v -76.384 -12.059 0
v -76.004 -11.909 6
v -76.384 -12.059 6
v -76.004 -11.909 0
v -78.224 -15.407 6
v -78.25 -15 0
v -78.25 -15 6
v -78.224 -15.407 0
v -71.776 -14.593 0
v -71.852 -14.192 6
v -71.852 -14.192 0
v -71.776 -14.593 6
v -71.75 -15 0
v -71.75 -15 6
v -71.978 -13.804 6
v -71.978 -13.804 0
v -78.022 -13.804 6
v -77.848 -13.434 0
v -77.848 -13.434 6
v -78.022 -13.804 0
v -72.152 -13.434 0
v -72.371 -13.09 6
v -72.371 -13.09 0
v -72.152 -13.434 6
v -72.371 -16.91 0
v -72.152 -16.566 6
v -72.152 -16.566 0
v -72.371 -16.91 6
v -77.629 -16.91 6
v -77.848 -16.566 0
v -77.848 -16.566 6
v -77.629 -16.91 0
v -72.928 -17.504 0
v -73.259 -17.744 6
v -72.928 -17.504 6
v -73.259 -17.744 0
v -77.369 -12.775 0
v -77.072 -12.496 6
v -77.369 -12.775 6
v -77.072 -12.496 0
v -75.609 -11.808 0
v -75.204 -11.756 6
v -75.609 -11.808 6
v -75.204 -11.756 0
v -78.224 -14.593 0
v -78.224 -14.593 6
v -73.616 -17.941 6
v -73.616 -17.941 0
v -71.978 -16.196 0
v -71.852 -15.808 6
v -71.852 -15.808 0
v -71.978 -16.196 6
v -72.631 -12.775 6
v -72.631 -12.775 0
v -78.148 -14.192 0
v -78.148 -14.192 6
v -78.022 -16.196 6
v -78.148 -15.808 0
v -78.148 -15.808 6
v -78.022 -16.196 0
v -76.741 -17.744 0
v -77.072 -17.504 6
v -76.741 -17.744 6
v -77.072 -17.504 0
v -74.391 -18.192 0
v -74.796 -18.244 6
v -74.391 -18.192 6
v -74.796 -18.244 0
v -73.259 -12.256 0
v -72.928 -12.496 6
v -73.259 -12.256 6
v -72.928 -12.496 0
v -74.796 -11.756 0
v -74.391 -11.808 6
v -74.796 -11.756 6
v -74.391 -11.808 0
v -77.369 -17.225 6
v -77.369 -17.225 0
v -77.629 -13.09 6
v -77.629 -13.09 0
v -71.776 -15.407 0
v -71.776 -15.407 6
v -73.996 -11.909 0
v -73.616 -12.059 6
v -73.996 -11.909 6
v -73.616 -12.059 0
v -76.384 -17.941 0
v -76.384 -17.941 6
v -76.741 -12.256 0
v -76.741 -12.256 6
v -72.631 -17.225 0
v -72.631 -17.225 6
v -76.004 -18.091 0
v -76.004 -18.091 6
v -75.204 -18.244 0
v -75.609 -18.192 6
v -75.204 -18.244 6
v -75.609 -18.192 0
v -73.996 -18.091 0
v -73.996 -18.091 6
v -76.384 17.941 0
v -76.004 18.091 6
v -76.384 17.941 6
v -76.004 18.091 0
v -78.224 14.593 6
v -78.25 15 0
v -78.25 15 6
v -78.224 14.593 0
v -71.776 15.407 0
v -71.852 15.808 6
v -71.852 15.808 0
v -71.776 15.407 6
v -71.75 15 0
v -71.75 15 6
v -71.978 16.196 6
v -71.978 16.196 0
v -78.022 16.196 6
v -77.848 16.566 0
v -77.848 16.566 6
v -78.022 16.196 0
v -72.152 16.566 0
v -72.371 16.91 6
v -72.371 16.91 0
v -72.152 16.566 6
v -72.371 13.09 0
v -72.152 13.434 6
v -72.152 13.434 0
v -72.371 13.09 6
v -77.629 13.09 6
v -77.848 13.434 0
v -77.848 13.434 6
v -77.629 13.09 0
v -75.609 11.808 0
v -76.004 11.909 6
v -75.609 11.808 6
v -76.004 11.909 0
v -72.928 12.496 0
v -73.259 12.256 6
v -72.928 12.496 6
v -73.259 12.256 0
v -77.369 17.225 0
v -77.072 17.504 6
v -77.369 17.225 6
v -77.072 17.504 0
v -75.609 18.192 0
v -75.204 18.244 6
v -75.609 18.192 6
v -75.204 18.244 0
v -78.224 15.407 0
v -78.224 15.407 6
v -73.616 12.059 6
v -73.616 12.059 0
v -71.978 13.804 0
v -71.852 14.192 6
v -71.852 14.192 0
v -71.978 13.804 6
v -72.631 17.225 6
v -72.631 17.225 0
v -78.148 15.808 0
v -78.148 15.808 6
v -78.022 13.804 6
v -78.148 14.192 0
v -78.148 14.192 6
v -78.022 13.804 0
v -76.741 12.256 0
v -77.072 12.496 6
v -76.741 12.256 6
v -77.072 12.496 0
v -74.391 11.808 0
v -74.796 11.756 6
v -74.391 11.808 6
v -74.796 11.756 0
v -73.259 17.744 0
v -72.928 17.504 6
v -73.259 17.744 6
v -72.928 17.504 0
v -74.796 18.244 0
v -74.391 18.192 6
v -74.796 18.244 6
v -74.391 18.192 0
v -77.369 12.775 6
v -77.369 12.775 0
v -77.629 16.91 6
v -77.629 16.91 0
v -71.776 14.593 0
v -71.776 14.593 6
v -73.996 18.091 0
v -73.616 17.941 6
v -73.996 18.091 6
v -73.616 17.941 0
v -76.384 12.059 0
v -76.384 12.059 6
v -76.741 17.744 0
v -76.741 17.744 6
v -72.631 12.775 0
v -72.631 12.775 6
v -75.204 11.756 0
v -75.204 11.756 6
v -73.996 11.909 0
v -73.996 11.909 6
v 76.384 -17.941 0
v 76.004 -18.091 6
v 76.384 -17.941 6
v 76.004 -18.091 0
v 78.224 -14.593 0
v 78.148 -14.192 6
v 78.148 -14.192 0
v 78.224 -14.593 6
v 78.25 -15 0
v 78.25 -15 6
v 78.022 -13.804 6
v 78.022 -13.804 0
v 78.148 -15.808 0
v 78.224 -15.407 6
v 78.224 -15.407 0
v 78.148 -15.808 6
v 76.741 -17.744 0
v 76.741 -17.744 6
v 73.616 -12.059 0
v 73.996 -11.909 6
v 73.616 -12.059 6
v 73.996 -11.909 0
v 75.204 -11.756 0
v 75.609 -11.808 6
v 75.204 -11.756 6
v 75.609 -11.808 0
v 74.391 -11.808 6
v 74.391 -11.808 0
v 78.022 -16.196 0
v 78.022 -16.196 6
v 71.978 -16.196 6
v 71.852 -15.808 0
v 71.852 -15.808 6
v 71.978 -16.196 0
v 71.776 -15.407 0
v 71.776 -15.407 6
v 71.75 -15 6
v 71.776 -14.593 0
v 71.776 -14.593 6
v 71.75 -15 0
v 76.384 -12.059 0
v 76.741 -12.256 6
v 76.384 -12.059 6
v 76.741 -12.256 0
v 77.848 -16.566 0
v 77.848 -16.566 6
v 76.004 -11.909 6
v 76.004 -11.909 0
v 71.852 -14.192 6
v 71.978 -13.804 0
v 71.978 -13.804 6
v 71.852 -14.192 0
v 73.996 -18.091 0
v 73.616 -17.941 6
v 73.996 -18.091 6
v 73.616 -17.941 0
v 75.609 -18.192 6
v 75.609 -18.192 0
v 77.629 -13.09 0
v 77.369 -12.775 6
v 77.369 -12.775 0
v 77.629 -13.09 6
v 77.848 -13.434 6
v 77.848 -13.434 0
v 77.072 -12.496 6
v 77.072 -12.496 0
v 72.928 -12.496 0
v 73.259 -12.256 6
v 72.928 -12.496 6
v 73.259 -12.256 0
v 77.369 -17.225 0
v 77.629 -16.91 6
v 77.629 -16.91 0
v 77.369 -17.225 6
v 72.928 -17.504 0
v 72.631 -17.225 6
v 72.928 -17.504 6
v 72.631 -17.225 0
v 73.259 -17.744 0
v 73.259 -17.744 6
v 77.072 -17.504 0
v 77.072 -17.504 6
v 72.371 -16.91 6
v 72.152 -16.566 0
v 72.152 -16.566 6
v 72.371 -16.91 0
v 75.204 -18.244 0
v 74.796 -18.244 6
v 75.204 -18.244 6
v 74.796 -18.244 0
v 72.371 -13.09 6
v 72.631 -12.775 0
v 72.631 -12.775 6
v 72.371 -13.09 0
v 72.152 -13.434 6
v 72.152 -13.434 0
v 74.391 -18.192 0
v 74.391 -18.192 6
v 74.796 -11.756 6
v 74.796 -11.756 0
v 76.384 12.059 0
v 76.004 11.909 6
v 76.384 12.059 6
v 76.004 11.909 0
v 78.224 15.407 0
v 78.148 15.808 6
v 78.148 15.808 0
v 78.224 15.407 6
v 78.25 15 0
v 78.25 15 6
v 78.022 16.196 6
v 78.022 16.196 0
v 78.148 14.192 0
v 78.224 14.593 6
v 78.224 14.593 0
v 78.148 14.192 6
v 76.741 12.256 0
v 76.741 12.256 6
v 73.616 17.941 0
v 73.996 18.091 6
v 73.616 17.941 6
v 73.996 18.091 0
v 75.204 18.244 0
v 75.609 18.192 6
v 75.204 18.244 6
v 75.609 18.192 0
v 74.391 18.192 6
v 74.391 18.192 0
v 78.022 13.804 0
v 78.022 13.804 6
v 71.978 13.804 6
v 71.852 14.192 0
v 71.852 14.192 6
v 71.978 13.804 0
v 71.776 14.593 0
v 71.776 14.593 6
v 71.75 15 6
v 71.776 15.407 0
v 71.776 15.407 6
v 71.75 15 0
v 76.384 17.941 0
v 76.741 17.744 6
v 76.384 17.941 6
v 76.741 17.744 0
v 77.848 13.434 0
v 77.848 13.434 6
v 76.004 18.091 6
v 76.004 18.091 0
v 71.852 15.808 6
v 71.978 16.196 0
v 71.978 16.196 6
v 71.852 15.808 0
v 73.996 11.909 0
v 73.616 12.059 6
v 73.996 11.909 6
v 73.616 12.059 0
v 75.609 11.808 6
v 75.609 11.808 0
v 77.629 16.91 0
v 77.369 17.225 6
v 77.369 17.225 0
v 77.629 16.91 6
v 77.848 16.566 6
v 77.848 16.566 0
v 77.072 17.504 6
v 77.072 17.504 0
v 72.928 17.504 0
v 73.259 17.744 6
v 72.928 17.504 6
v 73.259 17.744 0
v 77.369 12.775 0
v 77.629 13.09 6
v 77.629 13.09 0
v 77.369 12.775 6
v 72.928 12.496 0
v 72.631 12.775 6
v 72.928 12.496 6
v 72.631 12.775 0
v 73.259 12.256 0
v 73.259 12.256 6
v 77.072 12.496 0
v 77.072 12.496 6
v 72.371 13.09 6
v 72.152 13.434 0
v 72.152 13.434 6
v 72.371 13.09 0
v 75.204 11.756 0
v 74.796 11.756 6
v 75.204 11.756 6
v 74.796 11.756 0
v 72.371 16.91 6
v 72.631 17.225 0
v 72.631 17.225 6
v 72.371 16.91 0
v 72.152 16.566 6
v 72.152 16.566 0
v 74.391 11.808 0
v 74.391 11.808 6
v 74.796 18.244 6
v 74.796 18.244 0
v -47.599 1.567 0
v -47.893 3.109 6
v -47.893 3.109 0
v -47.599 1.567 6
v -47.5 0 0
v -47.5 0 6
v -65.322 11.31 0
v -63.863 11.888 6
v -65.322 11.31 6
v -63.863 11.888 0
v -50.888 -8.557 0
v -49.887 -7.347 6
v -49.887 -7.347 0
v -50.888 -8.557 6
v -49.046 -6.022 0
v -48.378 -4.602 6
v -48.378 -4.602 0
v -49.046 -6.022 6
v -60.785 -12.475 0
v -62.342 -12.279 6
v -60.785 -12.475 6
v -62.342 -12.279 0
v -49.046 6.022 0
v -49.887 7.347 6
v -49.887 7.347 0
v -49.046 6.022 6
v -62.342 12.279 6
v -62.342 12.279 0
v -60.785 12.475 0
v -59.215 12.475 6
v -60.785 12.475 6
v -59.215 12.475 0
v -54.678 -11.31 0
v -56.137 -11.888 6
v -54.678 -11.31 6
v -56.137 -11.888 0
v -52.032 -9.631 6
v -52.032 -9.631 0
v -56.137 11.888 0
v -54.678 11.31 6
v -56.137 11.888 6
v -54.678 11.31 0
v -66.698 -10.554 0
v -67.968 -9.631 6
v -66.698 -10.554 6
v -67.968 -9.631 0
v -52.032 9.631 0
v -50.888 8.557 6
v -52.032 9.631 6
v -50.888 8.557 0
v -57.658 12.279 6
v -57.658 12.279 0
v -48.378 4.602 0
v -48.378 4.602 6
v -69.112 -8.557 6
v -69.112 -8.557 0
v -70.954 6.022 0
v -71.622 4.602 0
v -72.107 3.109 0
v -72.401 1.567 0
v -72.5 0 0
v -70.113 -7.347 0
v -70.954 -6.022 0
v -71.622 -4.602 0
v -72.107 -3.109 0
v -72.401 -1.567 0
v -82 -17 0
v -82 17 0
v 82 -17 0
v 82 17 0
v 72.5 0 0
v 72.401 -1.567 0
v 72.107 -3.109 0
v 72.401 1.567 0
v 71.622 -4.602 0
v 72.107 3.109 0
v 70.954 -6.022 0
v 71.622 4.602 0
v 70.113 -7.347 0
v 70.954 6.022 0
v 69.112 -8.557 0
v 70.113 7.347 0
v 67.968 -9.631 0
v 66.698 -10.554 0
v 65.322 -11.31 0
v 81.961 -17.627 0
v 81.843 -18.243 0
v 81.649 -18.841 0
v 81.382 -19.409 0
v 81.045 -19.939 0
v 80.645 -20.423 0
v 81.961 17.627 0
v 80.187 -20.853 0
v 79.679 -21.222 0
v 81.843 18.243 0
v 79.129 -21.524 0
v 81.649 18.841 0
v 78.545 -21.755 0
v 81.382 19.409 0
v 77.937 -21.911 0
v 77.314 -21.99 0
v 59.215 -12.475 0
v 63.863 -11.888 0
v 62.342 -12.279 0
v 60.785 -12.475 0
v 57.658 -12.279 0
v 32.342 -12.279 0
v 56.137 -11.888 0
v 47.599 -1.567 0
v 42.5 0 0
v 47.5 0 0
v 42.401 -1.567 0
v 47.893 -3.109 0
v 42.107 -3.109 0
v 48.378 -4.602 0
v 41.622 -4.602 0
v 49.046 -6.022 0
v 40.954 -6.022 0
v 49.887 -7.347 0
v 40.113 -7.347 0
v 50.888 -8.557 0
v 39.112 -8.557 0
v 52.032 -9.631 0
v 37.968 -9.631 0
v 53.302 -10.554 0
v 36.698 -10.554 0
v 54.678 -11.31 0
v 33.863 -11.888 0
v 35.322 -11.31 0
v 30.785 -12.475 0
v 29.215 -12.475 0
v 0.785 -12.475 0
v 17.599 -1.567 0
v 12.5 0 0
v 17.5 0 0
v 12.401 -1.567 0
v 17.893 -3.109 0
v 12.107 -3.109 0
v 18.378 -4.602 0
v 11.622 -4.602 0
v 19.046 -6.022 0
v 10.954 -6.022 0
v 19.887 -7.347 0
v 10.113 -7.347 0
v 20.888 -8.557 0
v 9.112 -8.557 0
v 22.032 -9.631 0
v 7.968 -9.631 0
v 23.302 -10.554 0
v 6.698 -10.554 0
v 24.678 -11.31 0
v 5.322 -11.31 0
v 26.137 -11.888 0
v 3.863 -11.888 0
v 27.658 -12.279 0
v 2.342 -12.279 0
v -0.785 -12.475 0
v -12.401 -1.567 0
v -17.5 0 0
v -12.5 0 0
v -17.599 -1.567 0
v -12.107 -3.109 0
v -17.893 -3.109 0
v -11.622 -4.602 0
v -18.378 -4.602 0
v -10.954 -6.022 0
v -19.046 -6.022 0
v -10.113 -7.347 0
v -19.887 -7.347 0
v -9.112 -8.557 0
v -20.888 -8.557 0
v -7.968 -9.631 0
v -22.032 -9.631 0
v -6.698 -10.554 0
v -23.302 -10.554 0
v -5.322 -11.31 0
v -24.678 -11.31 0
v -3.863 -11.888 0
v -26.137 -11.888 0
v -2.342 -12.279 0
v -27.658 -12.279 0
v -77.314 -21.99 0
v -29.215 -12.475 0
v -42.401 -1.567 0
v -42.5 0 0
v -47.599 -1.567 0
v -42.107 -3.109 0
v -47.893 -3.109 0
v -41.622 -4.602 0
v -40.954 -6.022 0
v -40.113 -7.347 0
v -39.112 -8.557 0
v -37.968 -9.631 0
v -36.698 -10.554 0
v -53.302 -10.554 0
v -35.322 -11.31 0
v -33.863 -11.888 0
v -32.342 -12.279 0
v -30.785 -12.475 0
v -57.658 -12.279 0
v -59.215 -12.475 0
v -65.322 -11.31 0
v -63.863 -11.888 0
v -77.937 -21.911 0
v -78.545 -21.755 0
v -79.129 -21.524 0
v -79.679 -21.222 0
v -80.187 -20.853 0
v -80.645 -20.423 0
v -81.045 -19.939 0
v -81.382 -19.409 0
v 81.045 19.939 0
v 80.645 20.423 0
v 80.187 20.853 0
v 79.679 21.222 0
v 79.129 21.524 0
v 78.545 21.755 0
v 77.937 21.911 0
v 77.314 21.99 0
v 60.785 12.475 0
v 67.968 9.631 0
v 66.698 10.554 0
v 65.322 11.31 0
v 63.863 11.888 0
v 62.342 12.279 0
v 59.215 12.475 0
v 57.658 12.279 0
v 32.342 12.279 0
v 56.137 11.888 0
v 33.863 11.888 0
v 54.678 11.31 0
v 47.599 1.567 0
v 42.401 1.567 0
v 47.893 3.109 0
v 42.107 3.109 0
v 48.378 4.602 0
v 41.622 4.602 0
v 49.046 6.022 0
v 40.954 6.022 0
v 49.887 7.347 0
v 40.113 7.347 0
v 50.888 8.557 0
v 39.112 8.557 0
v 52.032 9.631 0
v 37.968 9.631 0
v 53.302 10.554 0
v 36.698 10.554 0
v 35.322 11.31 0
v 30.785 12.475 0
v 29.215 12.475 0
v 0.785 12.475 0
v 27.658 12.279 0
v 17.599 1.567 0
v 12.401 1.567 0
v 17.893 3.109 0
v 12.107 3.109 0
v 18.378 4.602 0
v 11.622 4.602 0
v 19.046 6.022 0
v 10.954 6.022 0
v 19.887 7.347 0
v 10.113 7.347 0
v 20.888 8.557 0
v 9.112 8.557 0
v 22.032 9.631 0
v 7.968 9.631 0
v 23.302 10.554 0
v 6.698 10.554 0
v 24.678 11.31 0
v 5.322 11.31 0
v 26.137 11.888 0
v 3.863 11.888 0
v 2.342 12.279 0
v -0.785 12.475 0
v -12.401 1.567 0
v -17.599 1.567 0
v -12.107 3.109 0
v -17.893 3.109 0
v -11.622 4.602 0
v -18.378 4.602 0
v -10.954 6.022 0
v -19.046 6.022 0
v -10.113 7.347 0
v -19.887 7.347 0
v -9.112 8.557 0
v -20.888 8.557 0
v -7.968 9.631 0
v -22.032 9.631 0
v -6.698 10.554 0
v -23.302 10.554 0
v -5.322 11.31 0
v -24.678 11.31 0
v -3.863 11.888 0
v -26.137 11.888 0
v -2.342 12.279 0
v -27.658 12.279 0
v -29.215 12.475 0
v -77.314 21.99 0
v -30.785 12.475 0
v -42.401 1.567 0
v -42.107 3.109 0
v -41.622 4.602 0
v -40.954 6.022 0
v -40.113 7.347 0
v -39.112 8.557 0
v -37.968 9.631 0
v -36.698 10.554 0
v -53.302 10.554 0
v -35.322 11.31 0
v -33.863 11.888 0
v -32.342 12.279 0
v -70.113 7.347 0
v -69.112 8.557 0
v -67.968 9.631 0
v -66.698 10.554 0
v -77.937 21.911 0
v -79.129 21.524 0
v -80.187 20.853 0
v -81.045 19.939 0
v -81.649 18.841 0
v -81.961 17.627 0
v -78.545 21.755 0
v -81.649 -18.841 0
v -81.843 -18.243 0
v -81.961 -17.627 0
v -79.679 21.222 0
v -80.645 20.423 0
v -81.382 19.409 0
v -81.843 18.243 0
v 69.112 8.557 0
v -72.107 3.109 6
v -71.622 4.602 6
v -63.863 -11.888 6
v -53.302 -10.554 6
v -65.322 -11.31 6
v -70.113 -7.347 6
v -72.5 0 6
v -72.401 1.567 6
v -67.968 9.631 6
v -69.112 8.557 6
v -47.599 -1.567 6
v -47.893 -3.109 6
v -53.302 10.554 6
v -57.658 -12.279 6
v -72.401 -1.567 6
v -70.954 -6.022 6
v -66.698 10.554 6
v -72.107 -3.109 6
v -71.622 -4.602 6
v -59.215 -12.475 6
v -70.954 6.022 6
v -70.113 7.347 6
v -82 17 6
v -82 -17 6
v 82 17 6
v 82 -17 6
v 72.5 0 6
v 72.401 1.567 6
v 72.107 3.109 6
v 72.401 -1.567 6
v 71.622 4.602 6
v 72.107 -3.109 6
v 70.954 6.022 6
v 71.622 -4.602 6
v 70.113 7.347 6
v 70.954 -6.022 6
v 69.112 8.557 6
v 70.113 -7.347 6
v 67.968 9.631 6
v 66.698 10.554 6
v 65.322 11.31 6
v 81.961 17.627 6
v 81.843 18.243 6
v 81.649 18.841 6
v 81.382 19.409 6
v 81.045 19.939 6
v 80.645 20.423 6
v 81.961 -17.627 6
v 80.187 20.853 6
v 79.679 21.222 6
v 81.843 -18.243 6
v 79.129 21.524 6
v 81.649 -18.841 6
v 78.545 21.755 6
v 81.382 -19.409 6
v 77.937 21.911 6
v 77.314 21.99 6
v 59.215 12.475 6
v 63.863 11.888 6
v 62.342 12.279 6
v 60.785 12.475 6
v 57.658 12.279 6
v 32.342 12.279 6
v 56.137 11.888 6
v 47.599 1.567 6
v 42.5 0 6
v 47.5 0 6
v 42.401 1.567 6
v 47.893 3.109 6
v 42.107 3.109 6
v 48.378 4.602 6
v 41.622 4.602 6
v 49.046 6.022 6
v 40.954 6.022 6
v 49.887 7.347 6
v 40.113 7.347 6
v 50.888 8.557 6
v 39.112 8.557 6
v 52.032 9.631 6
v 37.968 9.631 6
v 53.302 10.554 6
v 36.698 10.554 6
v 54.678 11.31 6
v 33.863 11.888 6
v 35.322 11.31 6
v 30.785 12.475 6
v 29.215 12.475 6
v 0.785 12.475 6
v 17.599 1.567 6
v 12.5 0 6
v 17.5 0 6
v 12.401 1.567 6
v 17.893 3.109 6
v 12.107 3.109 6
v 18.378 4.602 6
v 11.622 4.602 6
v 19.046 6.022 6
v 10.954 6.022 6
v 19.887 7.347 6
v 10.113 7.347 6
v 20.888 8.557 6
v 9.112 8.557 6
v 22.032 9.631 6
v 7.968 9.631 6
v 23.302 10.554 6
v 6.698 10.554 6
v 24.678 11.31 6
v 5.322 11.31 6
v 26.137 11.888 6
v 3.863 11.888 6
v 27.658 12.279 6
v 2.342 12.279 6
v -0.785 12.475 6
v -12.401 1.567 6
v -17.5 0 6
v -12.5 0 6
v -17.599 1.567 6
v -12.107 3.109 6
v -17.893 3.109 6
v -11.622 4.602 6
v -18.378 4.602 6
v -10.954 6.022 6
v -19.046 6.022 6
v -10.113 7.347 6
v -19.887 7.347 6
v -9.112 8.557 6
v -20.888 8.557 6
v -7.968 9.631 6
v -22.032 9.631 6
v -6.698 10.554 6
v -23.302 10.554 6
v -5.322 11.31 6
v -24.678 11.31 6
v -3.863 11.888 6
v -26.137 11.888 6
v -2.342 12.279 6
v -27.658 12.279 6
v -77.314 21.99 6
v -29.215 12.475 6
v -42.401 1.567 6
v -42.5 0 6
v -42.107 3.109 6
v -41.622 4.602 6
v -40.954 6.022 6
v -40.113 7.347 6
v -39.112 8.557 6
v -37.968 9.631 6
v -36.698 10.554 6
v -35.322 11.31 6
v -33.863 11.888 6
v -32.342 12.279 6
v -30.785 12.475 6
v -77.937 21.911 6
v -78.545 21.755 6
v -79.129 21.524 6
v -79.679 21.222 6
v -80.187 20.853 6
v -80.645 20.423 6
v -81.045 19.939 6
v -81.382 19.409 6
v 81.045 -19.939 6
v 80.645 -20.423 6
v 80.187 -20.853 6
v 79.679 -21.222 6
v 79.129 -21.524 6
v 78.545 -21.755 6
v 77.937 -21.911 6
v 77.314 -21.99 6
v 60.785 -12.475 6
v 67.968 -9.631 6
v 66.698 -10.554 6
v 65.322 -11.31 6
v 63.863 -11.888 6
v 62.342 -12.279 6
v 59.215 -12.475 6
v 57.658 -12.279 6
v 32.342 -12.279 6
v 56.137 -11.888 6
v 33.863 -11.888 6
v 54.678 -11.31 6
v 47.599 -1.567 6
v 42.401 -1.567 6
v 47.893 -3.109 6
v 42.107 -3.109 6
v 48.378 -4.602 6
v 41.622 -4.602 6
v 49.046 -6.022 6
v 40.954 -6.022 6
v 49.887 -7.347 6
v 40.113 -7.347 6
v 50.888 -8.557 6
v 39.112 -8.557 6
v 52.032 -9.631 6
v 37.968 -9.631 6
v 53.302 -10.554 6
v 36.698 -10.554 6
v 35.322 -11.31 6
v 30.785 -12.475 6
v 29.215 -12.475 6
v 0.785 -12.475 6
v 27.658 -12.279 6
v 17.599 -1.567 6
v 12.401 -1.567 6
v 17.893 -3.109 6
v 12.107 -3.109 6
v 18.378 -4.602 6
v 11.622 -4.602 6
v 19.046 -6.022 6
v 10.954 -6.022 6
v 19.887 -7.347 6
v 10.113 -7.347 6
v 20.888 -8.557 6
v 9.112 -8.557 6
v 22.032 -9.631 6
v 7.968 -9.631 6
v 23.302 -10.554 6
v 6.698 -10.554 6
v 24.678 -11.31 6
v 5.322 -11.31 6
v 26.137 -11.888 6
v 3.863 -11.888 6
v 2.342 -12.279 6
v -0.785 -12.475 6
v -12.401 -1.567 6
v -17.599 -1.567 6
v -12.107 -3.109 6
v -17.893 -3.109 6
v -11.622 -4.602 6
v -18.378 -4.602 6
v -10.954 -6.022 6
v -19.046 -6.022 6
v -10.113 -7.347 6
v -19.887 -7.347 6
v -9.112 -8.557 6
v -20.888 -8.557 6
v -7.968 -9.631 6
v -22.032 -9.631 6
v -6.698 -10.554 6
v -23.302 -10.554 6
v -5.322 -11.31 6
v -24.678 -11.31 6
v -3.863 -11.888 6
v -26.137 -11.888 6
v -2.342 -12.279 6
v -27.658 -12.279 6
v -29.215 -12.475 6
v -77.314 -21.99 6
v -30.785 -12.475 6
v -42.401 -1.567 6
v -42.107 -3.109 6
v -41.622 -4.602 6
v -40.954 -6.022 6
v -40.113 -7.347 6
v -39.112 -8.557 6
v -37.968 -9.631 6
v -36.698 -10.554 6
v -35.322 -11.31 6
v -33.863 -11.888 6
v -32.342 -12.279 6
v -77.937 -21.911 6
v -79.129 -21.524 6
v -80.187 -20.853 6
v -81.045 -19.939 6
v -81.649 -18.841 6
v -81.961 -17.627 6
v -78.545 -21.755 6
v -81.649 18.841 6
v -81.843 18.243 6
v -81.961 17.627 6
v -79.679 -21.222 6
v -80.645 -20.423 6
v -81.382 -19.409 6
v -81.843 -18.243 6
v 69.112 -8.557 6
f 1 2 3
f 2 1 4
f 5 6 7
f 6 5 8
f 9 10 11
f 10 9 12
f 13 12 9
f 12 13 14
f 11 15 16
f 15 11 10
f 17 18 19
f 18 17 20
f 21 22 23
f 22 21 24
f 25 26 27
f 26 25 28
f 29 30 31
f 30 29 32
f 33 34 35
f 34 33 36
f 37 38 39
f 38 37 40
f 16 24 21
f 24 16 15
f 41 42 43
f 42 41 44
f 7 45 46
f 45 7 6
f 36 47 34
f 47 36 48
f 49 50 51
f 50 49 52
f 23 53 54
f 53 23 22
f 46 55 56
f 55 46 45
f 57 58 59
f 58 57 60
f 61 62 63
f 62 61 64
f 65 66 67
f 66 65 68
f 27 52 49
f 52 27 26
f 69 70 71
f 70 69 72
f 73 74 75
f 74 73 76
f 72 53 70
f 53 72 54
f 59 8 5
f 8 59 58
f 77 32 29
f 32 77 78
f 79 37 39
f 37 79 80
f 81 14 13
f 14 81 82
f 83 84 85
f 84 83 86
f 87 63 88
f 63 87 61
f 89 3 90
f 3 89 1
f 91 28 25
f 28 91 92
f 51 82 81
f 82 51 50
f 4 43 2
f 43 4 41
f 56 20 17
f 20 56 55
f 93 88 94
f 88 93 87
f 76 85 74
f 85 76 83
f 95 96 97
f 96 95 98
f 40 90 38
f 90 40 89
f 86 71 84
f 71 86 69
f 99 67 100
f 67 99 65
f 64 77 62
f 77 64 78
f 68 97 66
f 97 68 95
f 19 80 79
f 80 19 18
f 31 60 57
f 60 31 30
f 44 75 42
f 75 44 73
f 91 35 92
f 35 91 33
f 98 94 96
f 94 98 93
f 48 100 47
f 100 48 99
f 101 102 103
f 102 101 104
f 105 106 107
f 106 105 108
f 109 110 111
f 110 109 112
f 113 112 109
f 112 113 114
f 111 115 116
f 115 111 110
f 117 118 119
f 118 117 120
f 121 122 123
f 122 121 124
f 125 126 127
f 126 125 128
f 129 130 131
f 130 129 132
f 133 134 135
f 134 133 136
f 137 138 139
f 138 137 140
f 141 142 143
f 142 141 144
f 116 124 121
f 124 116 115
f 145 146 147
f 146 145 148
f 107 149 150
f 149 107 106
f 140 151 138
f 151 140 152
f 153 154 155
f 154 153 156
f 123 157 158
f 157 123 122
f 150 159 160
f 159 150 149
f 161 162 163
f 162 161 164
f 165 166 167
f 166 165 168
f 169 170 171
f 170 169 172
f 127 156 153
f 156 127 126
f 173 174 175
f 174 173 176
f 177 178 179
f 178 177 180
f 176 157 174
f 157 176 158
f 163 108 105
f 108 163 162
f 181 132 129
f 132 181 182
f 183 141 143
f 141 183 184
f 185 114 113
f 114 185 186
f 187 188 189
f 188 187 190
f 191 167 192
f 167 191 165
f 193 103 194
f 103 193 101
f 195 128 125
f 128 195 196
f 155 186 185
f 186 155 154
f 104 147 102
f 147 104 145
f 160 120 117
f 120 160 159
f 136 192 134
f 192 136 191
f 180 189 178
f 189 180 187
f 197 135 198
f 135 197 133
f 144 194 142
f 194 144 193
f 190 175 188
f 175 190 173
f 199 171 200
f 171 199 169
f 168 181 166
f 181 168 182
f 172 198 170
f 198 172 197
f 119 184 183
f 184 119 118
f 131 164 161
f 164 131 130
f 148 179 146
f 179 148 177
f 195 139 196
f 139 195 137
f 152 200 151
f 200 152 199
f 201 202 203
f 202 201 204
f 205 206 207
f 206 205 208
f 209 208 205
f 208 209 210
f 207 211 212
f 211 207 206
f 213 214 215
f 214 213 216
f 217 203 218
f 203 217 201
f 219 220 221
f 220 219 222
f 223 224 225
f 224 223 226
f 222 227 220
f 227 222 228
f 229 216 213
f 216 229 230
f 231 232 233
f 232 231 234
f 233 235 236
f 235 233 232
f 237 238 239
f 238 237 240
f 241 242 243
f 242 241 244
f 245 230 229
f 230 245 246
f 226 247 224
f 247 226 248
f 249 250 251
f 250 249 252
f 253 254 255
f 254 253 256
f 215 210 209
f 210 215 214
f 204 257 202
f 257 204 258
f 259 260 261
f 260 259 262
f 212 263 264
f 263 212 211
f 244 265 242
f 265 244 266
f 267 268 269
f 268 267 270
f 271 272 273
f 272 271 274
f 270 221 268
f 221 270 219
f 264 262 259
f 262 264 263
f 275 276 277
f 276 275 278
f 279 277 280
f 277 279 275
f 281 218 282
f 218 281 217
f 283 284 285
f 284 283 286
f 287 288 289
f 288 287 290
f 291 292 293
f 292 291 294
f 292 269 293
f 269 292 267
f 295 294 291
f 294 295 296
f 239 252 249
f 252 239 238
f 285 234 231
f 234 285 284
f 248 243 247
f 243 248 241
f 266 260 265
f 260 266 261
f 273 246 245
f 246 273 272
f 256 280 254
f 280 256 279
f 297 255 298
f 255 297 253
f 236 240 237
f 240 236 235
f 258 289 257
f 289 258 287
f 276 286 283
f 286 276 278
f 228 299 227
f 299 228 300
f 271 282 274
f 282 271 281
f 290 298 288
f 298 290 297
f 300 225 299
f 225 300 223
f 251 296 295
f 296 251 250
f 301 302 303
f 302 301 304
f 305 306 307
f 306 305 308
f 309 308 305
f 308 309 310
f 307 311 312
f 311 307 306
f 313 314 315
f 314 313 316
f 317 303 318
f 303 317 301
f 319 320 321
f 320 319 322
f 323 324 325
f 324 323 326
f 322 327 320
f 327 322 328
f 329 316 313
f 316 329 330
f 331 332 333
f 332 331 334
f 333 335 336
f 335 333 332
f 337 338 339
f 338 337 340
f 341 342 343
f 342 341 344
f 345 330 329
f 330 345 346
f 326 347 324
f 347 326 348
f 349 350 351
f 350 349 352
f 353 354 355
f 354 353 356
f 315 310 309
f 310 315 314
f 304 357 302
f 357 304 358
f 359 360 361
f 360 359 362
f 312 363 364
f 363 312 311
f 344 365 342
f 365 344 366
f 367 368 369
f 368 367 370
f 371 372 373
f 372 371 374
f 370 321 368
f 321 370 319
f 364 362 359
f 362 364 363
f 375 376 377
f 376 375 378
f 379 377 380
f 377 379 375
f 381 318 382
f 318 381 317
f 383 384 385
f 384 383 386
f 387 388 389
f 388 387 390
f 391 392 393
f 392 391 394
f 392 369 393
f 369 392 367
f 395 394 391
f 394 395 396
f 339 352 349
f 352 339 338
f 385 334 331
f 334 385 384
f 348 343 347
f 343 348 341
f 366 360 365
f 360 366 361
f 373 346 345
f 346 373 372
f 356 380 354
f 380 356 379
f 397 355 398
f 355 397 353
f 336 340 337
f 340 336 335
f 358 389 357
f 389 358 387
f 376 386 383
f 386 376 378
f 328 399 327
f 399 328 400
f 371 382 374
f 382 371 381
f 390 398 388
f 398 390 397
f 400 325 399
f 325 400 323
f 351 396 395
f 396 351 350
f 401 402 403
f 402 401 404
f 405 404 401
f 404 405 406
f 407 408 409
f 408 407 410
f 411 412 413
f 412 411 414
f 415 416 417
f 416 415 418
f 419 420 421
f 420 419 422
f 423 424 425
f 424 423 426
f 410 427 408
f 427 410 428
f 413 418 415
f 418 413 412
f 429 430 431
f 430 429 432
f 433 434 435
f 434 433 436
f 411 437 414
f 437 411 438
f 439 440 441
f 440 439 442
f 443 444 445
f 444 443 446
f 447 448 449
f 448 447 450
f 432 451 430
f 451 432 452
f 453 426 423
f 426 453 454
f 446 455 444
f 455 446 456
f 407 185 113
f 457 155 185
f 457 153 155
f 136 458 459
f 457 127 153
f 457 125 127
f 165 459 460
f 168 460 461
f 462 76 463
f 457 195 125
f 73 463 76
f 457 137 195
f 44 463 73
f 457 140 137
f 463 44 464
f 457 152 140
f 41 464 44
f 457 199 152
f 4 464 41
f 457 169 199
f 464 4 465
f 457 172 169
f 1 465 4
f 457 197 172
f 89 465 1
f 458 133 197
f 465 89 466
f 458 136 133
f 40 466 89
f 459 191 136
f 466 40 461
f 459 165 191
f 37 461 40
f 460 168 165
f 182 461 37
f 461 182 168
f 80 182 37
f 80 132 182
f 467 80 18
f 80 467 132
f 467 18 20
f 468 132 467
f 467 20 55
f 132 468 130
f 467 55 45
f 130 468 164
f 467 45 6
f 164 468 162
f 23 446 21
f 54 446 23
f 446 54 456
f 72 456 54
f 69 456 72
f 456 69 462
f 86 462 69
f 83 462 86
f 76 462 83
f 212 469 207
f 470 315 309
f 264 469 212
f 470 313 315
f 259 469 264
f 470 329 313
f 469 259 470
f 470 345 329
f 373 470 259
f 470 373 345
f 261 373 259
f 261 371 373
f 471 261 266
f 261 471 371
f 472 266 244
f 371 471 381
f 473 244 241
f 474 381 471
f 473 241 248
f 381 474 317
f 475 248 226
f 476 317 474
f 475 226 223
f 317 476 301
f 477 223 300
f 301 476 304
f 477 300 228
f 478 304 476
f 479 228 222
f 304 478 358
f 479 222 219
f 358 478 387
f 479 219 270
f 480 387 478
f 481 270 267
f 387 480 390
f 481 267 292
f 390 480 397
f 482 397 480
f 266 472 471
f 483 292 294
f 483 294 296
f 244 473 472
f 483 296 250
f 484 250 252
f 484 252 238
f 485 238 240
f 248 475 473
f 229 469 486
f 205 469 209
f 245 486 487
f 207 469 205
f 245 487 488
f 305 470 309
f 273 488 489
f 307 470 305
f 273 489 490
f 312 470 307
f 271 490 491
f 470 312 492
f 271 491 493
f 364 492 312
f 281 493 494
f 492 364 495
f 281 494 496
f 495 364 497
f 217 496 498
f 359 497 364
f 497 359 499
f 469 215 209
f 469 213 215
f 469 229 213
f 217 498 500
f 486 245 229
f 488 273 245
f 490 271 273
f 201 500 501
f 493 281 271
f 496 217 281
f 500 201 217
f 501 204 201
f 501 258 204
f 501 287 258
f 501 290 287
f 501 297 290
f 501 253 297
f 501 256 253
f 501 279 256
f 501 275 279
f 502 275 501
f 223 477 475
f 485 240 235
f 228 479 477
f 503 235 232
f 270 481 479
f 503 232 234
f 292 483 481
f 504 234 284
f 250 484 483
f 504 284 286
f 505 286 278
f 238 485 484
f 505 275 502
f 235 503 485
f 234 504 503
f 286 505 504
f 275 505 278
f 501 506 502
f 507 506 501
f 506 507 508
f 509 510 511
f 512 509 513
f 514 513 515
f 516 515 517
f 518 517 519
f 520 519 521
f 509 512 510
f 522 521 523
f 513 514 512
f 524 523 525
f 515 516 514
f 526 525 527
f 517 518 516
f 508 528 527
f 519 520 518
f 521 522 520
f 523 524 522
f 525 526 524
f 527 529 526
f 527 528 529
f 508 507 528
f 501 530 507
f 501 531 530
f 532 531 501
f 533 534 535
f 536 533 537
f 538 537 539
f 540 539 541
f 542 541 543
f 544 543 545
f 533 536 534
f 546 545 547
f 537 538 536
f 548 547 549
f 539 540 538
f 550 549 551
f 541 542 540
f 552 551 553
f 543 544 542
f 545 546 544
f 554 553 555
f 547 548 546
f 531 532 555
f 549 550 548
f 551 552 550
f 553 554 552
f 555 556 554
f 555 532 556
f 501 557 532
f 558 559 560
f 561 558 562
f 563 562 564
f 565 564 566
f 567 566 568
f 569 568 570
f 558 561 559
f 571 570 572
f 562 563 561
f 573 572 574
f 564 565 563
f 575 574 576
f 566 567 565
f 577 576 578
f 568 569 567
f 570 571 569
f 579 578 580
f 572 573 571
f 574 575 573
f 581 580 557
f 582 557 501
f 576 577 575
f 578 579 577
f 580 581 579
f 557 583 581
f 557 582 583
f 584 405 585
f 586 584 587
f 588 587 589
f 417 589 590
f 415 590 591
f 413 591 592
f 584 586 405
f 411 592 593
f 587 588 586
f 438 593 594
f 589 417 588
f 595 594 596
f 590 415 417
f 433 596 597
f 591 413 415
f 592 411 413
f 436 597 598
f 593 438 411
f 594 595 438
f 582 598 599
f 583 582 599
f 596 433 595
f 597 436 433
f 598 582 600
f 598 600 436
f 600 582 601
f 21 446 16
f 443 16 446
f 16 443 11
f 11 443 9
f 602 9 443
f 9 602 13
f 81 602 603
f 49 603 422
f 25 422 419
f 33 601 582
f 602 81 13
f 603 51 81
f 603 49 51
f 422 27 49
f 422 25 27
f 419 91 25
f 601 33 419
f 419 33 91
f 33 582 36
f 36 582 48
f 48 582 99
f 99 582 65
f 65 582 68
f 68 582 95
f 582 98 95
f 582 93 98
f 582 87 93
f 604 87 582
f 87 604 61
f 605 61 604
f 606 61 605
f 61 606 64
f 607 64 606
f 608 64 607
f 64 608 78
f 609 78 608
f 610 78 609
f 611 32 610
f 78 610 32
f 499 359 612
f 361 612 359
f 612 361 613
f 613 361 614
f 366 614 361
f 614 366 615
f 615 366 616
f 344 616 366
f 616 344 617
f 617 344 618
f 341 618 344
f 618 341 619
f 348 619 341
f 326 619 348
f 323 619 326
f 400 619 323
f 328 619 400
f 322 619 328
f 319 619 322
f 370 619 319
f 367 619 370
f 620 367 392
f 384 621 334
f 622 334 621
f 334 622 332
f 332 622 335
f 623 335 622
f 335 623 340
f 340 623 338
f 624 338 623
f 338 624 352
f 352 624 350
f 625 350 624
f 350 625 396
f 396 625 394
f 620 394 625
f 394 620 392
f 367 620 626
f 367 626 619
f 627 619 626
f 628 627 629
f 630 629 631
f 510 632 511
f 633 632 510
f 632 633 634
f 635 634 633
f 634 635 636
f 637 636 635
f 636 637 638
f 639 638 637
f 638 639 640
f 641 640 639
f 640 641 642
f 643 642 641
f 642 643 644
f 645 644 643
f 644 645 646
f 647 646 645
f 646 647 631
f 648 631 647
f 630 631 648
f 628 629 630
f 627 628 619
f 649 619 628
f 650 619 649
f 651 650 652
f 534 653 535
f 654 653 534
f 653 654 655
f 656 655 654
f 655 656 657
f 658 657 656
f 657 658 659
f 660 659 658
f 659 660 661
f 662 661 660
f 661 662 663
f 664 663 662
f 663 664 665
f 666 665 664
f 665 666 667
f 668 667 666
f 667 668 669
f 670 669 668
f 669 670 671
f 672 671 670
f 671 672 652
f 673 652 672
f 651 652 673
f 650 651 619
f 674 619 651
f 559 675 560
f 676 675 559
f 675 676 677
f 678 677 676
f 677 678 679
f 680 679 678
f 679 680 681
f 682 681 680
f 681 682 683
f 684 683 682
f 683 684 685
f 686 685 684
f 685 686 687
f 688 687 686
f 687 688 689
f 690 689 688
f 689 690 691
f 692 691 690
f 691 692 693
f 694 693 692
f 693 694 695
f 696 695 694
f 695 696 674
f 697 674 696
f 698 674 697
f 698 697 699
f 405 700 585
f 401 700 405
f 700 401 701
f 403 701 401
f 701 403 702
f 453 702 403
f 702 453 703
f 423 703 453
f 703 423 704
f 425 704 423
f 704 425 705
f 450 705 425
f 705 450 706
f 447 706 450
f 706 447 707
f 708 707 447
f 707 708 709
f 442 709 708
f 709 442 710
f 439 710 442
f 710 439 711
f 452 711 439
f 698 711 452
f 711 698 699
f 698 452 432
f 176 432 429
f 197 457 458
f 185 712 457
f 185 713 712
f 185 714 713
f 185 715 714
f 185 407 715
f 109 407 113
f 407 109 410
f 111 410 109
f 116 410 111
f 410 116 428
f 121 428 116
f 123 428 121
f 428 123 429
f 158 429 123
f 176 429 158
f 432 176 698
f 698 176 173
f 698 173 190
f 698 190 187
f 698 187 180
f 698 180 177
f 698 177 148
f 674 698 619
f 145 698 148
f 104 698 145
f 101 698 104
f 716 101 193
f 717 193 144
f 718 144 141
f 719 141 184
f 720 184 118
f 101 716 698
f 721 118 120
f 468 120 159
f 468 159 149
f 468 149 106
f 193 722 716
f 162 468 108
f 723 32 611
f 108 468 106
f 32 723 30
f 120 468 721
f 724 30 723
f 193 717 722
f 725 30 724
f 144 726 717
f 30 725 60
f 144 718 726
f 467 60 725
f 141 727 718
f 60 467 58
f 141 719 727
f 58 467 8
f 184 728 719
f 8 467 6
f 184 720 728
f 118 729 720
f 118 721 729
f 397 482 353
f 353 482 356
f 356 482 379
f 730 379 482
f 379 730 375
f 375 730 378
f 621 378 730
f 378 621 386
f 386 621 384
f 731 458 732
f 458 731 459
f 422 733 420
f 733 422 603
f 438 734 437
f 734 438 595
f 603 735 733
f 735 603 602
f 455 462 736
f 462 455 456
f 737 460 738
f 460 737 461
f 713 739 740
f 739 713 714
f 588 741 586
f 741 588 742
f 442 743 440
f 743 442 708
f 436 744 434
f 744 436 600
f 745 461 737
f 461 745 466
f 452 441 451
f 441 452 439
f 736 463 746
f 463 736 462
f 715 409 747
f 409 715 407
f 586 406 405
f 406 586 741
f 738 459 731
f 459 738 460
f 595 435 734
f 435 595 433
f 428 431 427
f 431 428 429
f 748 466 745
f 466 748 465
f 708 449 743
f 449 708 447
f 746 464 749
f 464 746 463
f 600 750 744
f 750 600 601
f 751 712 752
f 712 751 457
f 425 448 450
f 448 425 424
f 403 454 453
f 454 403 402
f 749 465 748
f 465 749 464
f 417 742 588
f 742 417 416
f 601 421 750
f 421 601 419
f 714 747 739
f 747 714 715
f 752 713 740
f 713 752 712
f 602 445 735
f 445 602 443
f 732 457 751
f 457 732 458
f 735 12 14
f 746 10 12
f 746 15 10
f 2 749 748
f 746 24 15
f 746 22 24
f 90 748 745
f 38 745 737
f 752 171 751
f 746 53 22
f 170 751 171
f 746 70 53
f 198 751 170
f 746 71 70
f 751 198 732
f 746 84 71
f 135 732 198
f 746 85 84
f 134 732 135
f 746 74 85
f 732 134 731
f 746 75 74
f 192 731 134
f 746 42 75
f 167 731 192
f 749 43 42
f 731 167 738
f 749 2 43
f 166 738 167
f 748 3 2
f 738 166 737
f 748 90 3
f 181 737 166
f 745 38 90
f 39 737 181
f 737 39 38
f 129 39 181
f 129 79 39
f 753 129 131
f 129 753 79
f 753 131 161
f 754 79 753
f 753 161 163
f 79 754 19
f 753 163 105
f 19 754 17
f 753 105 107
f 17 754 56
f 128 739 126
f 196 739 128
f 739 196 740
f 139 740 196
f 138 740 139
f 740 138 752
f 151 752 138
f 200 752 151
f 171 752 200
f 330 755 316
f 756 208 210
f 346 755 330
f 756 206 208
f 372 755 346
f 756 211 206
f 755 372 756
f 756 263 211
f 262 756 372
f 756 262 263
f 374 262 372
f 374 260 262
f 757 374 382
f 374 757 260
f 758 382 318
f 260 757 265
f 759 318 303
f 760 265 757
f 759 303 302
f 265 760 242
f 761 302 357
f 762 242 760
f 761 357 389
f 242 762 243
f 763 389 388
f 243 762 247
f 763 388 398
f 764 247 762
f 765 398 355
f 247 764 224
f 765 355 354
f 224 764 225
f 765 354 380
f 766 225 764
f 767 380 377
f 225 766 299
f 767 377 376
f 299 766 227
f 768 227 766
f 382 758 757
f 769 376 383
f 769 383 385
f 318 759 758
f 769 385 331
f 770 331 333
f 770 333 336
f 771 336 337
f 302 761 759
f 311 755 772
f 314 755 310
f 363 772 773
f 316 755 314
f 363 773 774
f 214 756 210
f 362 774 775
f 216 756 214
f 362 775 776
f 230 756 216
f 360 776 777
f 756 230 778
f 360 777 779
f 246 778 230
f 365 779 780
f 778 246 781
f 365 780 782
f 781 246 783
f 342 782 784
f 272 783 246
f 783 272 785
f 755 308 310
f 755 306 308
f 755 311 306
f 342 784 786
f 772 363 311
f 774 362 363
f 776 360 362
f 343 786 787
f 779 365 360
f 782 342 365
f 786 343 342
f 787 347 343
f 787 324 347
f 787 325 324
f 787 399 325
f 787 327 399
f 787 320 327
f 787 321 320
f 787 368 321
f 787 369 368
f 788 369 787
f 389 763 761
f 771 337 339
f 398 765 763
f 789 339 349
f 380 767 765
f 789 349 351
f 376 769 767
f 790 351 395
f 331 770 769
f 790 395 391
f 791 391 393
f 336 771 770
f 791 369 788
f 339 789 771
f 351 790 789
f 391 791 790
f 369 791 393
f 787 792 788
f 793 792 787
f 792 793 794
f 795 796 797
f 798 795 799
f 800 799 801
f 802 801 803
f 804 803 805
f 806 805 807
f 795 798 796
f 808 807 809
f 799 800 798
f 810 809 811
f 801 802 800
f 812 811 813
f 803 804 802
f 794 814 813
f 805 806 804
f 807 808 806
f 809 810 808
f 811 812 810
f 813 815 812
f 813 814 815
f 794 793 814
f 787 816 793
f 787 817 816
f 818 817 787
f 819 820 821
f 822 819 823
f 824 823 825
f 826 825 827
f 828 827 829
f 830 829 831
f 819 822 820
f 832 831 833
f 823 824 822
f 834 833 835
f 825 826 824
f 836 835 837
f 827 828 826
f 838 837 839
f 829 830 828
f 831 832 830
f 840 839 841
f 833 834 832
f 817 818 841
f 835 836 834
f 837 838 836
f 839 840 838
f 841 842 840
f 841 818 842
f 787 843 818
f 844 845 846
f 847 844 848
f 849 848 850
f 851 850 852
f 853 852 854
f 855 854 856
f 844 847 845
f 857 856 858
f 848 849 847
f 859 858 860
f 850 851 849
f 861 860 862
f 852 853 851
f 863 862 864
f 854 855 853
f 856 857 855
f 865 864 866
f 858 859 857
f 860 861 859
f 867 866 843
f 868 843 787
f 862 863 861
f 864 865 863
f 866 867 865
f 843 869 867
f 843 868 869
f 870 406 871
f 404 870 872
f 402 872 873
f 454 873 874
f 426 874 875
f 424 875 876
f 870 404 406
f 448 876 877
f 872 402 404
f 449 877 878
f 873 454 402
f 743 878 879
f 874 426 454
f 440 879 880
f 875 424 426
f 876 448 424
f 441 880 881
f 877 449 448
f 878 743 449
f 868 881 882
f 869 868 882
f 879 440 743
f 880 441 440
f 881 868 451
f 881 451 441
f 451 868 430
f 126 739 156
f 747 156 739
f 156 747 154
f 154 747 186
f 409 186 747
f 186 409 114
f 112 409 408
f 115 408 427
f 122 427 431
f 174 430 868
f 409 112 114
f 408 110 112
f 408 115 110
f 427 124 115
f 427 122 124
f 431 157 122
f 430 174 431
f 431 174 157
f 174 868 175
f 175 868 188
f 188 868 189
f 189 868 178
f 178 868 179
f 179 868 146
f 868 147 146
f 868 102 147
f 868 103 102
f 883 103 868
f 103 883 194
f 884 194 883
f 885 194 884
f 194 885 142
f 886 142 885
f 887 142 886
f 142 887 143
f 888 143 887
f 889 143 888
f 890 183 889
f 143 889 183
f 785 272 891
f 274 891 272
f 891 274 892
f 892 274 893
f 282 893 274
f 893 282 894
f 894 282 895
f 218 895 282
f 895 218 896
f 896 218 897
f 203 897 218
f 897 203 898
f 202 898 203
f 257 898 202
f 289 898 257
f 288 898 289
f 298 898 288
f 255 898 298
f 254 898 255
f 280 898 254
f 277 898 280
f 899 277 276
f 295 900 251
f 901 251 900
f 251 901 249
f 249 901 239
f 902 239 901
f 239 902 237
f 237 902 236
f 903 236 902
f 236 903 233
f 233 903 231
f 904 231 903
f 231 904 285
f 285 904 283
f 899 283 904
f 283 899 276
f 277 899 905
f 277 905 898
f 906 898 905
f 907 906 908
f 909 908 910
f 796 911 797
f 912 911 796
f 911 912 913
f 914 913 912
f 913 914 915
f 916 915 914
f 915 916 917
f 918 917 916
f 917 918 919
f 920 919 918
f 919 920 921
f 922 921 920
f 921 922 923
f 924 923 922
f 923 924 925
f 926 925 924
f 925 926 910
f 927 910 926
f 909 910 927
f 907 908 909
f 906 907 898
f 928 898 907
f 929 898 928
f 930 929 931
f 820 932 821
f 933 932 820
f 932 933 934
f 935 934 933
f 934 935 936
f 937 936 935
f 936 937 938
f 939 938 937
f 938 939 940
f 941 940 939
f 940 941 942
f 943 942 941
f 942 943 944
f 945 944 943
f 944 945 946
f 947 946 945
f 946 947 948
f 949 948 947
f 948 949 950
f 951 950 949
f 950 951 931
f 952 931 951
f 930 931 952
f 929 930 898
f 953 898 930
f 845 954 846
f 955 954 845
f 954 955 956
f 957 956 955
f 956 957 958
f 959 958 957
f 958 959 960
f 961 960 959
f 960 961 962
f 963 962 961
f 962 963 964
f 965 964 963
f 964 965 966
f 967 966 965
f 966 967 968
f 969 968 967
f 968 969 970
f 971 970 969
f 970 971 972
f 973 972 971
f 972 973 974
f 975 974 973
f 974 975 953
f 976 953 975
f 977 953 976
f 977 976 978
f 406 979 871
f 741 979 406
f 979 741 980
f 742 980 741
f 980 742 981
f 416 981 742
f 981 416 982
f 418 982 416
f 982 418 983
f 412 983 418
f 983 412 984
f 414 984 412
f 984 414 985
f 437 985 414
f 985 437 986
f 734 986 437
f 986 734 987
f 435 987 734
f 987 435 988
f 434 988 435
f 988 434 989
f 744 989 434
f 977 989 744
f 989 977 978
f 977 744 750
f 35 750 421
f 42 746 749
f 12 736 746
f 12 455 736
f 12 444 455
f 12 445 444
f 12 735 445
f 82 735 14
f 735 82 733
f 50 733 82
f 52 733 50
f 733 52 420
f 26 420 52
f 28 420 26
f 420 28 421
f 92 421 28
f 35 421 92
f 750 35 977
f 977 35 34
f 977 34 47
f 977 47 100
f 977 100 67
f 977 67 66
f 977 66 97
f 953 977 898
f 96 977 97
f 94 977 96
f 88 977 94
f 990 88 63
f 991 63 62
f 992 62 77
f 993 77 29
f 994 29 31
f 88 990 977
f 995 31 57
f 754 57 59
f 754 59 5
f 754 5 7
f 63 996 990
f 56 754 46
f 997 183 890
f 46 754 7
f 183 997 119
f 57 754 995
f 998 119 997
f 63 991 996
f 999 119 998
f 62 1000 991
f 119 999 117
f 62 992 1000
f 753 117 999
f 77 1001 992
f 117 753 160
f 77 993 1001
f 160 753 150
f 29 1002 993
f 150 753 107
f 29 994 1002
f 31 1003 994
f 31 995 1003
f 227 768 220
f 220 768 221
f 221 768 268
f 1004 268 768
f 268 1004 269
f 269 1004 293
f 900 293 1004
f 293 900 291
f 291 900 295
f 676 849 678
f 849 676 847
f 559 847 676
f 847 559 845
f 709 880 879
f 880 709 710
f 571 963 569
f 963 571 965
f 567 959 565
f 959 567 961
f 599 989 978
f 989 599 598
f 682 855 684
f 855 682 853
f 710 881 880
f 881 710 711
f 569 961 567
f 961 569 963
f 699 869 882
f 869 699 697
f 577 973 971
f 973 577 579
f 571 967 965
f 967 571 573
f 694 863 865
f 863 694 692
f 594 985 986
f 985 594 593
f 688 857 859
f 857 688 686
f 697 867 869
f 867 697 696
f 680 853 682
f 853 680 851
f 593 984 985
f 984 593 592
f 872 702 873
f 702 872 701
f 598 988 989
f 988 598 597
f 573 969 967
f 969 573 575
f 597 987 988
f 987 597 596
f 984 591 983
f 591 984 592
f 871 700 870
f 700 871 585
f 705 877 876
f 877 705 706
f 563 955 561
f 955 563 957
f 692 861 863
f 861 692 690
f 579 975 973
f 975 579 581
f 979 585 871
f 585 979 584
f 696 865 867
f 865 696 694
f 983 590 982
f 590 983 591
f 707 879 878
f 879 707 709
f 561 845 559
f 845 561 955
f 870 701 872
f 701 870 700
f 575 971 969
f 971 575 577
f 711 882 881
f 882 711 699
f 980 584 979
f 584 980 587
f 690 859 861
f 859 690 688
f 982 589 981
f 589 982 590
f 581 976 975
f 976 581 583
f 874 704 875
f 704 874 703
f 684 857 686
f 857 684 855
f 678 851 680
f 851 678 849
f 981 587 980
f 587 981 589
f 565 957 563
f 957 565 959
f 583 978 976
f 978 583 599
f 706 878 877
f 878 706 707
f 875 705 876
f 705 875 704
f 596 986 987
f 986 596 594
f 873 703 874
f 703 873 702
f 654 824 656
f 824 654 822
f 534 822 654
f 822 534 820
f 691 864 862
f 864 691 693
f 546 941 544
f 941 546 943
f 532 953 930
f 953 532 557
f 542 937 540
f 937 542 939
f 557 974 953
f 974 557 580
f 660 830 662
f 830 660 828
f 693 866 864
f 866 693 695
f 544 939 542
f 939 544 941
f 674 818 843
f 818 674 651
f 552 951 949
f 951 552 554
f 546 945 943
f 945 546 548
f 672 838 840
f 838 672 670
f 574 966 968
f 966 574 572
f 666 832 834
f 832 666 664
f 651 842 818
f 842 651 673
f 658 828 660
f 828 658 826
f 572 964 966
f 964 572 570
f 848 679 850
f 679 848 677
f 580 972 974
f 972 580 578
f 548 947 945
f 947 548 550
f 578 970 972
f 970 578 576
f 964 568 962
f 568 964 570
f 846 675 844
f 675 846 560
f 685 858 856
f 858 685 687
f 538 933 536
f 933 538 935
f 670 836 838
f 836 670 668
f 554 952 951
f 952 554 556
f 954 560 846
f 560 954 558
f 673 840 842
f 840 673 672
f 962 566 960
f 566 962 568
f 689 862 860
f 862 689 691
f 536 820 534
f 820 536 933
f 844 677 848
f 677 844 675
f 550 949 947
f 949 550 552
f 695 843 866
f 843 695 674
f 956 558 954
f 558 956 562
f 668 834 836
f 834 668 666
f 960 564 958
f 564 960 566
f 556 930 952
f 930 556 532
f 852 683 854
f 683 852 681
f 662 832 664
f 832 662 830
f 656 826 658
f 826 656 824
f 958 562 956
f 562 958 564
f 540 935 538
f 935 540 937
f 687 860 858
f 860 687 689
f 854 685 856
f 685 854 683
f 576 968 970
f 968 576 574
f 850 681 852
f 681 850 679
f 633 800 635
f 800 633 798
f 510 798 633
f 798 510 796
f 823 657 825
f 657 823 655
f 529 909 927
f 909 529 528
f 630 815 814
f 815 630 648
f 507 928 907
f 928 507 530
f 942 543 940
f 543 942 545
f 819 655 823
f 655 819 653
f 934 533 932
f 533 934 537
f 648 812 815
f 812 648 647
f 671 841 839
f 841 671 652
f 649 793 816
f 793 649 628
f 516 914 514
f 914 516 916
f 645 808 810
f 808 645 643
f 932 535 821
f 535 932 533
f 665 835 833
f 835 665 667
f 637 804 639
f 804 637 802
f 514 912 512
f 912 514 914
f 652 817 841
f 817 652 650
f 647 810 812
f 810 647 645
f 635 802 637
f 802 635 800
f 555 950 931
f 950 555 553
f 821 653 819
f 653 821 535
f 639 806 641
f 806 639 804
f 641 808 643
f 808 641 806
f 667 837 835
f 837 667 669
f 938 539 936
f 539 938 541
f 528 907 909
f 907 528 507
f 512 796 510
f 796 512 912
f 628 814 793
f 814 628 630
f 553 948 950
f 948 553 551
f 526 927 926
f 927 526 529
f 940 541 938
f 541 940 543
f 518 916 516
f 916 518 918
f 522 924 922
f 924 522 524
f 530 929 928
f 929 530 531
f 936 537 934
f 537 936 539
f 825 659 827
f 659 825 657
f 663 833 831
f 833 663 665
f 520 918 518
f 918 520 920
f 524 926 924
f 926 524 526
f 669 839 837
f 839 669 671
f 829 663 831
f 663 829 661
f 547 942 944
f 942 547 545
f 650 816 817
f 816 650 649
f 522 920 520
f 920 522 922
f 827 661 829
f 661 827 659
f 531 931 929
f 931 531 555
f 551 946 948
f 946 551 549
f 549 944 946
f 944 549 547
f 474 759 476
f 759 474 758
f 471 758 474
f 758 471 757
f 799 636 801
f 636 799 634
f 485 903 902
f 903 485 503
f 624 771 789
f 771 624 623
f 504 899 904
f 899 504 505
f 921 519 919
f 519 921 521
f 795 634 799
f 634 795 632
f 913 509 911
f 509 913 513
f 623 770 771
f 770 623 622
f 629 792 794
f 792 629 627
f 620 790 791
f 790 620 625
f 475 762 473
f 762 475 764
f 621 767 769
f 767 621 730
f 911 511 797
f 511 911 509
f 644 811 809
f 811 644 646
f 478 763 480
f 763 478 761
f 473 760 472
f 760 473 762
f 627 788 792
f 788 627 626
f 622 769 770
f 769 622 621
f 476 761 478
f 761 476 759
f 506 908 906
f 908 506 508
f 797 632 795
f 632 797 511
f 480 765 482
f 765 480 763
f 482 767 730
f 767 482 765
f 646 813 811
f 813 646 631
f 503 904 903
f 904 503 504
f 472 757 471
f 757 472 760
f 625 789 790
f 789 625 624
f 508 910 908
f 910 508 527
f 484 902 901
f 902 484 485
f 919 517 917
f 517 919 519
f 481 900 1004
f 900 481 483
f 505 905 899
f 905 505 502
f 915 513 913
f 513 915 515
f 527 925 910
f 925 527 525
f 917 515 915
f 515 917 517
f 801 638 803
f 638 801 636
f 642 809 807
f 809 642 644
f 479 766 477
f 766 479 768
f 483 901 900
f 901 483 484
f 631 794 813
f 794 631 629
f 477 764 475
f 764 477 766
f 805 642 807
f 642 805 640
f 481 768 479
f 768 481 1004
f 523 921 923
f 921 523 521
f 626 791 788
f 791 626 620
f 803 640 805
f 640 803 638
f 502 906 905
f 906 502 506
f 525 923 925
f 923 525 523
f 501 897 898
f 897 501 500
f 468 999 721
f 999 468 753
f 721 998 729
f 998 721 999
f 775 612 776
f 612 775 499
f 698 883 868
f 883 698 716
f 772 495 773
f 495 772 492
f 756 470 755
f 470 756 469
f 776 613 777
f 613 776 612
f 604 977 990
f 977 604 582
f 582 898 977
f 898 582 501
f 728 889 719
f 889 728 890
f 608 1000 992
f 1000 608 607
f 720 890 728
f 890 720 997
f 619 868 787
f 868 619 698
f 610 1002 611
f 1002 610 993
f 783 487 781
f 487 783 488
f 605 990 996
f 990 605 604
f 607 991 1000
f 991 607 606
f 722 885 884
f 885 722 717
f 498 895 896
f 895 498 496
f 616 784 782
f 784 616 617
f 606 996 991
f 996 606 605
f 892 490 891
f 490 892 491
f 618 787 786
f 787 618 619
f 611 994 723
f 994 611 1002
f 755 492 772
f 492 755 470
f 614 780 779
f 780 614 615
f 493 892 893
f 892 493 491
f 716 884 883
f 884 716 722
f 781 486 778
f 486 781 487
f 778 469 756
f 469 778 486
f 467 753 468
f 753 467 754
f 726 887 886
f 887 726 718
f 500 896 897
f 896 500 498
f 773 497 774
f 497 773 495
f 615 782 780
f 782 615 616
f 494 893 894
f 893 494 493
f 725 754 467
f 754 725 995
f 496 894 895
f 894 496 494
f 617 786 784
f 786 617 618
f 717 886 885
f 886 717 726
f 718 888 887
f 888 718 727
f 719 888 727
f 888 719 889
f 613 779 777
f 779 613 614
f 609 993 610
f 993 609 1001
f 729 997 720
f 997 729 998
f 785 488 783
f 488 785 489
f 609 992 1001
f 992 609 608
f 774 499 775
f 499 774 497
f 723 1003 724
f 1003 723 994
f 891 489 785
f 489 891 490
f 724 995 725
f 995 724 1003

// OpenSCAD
$fn = 50;


difference() {
	union() {
		hull() {
			translate(v = [-77.0000000000, 17.0000000000, 0]) {
				cylinder(h = 6, r = 5);
			}
			translate(v = [77.0000000000, 17.0000000000, 0]) {
				cylinder(h = 6, r = 5);
			}
			translate(v = [-77.0000000000, -17.0000000000, 0]) {
				cylinder(h = 6, r = 5);
			}
			translate(v = [77.0000000000, -17.0000000000, 0]) {
				cylinder(h = 6, r = 5);
			}
		}
	}
	union() {
		#translate(v = [-75.0000000000, -15.0000000000, -100.0000000000]) {
			cylinder(h = 200, r = 3.2500000000);
		}
		#translate(v = [-75.0000000000, 15.0000000000, -100.0000000000]) {
			cylinder(h = 200, r = 3.2500000000);
		}
		#translate(v = [75.0000000000, -15.0000000000, -100.0000000000]) {
			cylinder(h = 200, r = 3.2500000000);
		}
		#translate(v = [75.0000000000, 15.0000000000, -100.0000000000]) {
			cylinder(h = 200, r = 3.2500000000);
		}
		#translate(v = [-60.0000000000, 0, 0]) {
			cylinder(h = 6, r = 12.5000000000);
		}
		#translate(v = [-30.0000000000, 0, 0]) {
			cylinder(h = 6, r = 12.5000000000);
		}
		#cylinder(h = 6, r = 12.5000000000);
		#translate(v = [30.0000000000, 0, 0]) {
			cylinder(h = 6, r = 12.5000000000);
		}
		#translate(v = [60.0000000000, 0, 0]) {
			cylinder(h = 6, r = 12.5000000000);
		}
	}
}
